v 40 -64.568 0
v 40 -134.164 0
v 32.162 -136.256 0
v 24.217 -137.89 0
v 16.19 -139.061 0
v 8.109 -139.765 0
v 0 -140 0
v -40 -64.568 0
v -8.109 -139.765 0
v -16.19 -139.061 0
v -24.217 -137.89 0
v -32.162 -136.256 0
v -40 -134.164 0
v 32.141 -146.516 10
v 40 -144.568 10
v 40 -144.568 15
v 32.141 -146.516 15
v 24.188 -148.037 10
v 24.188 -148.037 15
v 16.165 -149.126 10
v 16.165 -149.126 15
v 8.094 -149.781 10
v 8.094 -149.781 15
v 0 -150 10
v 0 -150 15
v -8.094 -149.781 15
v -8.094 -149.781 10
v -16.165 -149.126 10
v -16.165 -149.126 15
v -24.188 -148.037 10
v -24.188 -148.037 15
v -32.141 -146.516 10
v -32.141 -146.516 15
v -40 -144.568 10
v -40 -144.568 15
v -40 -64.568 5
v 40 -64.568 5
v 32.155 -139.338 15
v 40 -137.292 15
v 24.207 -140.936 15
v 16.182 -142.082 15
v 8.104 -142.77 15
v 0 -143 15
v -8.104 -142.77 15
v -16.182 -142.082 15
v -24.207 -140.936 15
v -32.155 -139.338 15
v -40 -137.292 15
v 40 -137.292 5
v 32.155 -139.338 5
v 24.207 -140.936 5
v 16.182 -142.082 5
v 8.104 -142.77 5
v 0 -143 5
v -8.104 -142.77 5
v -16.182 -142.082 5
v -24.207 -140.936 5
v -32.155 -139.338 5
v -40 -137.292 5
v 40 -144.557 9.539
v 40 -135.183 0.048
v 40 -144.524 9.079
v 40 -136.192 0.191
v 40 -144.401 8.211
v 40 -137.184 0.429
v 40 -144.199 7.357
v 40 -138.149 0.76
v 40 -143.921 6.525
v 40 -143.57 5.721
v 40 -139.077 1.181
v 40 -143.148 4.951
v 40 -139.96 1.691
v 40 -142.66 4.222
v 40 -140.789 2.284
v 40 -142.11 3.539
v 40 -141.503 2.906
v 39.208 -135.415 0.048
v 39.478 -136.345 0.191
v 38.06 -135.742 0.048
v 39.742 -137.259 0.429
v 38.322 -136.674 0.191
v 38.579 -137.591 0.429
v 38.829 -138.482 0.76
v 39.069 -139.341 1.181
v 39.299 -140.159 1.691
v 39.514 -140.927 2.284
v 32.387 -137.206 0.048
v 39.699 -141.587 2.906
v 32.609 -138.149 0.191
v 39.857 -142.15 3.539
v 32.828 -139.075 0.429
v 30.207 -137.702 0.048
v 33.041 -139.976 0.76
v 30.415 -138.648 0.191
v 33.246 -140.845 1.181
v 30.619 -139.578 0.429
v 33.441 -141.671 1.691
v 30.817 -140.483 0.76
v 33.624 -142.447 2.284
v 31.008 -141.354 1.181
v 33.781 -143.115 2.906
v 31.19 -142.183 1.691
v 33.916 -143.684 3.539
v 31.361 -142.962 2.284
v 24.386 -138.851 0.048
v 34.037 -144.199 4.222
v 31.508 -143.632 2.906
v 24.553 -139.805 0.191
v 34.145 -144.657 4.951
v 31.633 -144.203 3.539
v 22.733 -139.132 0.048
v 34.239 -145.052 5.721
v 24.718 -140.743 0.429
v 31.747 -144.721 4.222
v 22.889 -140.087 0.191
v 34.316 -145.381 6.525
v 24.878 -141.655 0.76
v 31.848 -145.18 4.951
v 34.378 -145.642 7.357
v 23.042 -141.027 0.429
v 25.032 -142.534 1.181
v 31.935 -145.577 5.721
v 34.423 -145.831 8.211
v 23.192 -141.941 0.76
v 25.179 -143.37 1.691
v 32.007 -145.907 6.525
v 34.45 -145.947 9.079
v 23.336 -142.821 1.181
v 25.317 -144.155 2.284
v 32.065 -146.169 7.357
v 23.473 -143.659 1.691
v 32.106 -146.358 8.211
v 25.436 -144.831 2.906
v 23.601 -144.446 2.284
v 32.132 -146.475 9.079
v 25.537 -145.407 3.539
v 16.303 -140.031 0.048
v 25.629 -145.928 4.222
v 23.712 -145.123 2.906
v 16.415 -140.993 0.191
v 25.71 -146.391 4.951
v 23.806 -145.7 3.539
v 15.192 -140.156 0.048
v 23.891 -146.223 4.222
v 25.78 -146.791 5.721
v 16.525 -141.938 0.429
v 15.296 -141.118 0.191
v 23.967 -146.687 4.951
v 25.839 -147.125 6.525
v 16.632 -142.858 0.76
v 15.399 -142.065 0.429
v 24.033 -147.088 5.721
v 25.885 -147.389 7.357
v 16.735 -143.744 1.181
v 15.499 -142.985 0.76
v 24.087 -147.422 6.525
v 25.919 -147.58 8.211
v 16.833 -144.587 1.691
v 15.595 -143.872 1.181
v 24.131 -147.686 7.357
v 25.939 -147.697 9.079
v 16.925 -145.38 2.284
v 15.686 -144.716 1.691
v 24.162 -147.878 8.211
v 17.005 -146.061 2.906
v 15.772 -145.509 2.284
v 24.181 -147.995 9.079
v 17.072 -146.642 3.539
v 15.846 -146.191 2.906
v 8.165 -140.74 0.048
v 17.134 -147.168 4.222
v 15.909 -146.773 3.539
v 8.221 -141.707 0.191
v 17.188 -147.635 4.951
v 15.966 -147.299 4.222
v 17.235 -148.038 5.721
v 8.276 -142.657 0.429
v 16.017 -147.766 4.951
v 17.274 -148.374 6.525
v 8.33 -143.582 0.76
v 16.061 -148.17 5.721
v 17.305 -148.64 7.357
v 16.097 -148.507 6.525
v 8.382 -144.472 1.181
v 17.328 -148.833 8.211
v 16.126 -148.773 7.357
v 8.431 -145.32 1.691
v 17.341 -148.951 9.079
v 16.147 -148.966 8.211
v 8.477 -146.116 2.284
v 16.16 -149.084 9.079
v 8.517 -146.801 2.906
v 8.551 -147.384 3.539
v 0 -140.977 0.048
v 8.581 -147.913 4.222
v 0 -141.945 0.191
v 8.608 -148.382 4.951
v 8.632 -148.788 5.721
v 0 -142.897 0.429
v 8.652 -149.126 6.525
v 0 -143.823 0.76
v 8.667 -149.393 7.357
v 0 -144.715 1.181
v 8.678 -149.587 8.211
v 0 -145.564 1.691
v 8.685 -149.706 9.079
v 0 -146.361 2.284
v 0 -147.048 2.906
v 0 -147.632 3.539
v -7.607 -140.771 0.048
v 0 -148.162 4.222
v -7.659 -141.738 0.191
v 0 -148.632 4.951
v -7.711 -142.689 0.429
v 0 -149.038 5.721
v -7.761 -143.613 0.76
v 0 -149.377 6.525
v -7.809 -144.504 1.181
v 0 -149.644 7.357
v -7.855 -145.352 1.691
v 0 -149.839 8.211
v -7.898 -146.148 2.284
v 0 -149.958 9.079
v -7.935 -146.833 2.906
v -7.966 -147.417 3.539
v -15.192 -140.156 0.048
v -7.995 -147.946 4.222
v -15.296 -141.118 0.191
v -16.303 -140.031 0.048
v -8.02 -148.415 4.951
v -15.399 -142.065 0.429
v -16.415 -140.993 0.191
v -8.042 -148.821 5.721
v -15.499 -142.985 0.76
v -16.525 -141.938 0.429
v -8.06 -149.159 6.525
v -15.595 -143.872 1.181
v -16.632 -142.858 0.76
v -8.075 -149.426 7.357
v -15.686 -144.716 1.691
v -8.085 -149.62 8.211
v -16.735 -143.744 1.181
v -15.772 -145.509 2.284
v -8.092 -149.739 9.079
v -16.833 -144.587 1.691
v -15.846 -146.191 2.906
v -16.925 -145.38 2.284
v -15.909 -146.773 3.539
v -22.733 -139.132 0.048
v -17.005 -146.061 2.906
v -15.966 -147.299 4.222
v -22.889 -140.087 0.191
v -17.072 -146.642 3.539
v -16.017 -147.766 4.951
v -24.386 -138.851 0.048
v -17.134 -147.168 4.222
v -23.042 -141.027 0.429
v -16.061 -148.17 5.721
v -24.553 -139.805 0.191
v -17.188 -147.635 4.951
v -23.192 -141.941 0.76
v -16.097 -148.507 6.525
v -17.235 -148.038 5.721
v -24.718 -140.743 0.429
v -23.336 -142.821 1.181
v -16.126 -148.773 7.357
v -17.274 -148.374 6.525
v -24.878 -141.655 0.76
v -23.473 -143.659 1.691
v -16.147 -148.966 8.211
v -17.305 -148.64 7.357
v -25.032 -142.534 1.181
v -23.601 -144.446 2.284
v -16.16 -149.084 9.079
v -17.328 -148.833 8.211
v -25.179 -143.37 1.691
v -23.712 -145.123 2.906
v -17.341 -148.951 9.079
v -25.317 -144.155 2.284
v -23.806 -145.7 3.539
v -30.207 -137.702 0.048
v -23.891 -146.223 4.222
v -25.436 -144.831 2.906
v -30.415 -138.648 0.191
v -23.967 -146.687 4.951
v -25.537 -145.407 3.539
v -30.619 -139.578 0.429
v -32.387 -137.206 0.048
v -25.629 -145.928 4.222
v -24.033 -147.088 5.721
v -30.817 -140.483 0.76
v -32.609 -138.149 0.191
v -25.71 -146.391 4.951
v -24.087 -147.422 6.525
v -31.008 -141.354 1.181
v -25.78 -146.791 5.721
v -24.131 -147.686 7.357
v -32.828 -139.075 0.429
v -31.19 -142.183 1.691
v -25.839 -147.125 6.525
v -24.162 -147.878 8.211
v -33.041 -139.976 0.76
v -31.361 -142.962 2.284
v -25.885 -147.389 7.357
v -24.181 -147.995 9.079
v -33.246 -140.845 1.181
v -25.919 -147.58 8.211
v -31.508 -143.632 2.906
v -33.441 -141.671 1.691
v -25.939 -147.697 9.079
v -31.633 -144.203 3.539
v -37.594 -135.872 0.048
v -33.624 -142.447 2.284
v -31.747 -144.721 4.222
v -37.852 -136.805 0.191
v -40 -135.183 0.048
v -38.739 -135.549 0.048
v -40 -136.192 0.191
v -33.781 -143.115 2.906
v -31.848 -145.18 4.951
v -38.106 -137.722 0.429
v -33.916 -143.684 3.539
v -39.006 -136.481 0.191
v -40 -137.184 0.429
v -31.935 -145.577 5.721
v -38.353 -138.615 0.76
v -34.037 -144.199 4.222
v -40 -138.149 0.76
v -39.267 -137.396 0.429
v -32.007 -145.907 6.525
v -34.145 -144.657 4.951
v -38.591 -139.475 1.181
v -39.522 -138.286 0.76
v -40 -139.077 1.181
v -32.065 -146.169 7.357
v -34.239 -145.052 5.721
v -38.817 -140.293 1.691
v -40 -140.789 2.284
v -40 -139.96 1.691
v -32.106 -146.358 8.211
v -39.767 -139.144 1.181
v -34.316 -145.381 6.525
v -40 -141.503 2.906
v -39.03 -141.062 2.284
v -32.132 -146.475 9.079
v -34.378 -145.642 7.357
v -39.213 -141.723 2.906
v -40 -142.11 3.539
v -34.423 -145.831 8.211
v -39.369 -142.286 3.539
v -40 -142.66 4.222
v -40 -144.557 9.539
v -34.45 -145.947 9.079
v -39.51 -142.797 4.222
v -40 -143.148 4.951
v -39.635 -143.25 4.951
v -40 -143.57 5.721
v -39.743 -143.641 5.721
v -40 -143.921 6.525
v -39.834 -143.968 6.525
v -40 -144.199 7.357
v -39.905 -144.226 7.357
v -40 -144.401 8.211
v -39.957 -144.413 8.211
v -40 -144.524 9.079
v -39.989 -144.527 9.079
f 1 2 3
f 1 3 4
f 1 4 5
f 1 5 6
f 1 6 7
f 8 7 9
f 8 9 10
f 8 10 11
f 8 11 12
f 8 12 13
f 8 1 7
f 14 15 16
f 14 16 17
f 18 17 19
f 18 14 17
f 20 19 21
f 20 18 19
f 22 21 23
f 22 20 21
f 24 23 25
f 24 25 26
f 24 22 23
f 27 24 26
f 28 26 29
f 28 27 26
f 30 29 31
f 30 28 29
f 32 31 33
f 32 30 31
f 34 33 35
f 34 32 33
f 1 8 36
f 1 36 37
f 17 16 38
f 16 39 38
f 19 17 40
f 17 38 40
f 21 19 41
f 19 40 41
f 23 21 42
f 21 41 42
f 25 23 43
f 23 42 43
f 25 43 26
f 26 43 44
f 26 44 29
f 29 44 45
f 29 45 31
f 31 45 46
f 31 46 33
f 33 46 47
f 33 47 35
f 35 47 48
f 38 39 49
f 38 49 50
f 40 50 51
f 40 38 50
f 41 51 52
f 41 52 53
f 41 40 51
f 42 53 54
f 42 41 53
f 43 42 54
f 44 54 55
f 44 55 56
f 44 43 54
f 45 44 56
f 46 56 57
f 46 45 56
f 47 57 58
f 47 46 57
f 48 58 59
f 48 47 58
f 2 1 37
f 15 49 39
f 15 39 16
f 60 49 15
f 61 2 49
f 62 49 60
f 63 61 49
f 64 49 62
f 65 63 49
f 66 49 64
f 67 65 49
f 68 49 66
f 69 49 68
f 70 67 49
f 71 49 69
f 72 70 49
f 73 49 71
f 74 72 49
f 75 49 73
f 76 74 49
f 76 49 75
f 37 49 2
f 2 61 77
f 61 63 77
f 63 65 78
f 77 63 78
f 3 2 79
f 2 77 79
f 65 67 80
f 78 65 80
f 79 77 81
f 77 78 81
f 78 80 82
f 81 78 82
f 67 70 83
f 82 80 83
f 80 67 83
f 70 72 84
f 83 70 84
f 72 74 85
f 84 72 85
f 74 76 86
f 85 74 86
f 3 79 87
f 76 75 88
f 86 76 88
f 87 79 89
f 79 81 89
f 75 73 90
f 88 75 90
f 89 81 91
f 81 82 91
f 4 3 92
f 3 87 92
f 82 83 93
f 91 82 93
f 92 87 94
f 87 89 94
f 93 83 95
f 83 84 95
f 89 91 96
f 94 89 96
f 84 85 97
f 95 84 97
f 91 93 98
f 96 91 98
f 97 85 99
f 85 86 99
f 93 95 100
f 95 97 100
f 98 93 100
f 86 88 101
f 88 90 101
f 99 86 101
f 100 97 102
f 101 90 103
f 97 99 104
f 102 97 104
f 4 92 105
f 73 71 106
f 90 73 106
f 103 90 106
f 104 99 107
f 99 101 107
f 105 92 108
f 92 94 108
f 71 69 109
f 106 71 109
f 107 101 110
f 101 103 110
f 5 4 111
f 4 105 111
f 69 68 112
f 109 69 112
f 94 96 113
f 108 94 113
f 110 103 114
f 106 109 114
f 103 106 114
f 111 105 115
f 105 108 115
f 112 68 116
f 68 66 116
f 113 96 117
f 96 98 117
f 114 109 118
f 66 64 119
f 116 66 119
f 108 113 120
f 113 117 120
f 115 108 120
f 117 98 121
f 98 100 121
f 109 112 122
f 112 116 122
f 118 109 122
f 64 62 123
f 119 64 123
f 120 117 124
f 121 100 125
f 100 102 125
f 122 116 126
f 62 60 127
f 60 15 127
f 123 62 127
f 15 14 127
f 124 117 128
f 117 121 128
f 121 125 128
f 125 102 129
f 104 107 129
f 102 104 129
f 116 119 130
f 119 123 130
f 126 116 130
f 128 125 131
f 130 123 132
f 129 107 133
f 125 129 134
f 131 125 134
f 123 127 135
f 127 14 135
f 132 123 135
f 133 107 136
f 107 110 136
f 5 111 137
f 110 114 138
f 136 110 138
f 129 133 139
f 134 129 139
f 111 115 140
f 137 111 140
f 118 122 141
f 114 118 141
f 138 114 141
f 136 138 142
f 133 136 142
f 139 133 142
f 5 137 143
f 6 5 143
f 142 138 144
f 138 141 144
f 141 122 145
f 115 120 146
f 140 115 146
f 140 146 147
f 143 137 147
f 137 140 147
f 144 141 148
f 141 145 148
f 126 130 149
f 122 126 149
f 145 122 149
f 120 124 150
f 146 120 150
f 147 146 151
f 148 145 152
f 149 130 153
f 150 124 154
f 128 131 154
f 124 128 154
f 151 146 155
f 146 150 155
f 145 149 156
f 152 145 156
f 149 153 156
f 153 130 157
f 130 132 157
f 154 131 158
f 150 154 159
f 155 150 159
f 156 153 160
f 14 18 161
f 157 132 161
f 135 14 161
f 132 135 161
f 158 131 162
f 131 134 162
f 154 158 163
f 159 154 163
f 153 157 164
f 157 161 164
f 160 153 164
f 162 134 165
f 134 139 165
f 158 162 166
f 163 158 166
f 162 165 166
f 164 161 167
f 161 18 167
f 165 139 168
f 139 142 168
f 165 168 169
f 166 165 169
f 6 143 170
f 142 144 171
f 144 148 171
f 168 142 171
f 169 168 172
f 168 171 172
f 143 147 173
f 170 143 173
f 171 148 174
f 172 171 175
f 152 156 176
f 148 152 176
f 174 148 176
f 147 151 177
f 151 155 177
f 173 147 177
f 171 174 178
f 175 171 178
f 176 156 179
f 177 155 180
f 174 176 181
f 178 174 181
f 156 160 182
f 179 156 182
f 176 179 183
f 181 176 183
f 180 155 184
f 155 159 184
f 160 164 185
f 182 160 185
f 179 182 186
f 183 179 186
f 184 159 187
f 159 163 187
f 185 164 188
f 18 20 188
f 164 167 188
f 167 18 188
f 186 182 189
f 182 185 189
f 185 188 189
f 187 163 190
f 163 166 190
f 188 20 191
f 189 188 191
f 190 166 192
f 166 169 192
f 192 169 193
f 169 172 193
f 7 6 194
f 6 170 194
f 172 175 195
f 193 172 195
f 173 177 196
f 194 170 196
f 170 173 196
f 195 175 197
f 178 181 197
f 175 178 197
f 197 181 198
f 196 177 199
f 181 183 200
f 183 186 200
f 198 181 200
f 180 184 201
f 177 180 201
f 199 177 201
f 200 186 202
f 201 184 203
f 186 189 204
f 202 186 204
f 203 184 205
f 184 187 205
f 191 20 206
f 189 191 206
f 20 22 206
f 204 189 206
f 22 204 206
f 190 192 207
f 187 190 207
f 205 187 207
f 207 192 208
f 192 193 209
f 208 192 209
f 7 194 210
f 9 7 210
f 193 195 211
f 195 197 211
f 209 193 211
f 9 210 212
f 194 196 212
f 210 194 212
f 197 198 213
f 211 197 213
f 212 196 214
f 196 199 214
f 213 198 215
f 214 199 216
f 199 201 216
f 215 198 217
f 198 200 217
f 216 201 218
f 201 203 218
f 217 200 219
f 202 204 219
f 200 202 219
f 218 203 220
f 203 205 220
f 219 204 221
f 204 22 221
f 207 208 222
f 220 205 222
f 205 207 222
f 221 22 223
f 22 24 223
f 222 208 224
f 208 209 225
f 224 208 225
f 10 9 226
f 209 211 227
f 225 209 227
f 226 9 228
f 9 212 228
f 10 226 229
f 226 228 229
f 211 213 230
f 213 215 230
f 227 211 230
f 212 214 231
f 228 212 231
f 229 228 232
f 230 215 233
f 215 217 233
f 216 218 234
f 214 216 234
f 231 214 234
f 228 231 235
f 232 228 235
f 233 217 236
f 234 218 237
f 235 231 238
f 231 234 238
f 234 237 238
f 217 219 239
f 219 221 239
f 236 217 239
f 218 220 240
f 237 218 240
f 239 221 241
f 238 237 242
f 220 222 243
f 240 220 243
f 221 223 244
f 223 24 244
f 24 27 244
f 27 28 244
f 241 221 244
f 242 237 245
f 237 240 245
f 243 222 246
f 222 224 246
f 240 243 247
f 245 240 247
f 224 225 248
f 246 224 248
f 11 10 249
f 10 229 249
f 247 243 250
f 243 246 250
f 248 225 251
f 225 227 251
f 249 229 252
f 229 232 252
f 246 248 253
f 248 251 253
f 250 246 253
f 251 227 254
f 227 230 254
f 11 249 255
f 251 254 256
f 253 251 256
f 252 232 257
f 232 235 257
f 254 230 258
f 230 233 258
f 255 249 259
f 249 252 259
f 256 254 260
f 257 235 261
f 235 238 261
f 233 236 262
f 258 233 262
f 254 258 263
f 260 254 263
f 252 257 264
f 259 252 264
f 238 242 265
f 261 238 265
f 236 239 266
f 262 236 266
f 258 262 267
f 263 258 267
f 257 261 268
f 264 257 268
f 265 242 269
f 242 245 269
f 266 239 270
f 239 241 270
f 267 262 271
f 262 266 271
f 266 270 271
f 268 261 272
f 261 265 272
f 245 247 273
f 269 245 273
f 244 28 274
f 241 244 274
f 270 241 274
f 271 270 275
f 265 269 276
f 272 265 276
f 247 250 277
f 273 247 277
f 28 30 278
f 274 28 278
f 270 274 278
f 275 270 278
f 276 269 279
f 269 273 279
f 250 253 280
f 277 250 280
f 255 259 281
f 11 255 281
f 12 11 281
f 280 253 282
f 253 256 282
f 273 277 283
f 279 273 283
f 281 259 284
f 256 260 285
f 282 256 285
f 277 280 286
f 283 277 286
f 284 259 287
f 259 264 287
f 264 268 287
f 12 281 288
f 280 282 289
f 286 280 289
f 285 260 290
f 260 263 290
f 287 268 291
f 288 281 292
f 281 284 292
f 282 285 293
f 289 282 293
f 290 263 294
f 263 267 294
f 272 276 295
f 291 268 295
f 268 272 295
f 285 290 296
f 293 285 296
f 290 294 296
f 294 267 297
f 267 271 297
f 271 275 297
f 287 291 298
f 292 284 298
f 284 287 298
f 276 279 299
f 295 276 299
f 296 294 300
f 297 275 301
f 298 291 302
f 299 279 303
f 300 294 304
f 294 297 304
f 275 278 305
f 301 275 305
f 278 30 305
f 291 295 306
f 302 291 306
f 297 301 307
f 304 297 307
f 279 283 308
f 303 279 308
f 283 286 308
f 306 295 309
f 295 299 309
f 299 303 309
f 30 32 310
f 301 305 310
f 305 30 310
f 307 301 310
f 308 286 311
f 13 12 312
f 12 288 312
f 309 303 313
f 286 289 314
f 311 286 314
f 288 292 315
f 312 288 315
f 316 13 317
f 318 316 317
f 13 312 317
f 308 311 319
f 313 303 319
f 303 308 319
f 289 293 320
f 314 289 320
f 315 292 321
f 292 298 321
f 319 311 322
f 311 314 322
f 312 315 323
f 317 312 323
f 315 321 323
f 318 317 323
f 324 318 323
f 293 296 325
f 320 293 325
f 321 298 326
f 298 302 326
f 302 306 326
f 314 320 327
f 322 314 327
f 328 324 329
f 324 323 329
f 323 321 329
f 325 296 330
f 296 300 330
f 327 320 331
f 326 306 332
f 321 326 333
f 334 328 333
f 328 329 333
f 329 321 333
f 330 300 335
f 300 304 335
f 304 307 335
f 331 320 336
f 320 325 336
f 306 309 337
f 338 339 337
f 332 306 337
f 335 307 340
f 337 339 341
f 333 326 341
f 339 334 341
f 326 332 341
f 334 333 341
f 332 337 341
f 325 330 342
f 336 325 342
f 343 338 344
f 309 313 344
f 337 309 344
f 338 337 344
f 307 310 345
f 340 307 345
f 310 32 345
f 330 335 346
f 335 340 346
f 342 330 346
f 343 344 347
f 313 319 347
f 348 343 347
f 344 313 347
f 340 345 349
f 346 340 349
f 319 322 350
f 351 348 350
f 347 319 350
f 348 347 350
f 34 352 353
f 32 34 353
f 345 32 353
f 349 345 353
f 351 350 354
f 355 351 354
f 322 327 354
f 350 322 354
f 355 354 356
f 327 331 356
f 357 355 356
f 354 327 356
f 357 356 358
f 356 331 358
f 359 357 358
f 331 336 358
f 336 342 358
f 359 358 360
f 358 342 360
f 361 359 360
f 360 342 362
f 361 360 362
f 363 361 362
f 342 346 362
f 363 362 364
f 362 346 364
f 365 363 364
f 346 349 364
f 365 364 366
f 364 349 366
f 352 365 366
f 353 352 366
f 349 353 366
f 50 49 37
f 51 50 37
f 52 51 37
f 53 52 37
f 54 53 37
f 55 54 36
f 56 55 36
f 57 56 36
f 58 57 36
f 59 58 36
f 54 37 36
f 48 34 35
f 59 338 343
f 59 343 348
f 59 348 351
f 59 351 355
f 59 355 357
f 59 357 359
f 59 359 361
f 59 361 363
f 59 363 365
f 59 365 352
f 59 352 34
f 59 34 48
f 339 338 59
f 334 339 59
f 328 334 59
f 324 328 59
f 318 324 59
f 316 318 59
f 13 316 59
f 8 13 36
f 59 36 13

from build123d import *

# Parameters (mm, degrees)
BOSS_EXTRUDE1_DEPTH = 15
CUT_EXTRUDE1_DEPTH  = 10
FILLET1_R           = 10


with BuildPart() as part:
    # Sketch2 → Boss-Extrude1 (new body)
    with BuildSketch(Plane.XY):
        with BuildLine():
            Line((-40, -144.568322948), (-40, -64.568322948))
            Line((-40, -64.568322948), (40, -64.568322948))
            Line((40, -64.568322948), (40, -144.568322948))
            ThreePointArc((40, -144.568322948), (0, -150), (-40, -144.568322948))
        make_face()
    extrude(amount=BOSS_EXTRUDE1_DEPTH)

    # Sketch3 → Cut-Extrude1 (cut)
    with BuildSketch(Plane.XY.offset(15)):
        with BuildLine():
            Line((-40, -137.291660344), (-40, -64.568322948))
            Line((-40, -64.568322948), (40, -64.568322948))
            Line((40, -64.568322948), (40, -137.291660344))
            ThreePointArc((40, -137.291660344), (0, -143), (-40, -137.291660344))
        make_face()
    extrude(amount=-CUT_EXTRUDE1_DEPTH, mode=Mode.SUBTRACT)

    # Fillet1
    fillet1_edges = [part.edges().sort_by_distance(p)[0] for p in [
        (0, -150, 0),
    ]]
    fillet(fillet1_edges, radius=FILLET1_R)


solid = part.part
